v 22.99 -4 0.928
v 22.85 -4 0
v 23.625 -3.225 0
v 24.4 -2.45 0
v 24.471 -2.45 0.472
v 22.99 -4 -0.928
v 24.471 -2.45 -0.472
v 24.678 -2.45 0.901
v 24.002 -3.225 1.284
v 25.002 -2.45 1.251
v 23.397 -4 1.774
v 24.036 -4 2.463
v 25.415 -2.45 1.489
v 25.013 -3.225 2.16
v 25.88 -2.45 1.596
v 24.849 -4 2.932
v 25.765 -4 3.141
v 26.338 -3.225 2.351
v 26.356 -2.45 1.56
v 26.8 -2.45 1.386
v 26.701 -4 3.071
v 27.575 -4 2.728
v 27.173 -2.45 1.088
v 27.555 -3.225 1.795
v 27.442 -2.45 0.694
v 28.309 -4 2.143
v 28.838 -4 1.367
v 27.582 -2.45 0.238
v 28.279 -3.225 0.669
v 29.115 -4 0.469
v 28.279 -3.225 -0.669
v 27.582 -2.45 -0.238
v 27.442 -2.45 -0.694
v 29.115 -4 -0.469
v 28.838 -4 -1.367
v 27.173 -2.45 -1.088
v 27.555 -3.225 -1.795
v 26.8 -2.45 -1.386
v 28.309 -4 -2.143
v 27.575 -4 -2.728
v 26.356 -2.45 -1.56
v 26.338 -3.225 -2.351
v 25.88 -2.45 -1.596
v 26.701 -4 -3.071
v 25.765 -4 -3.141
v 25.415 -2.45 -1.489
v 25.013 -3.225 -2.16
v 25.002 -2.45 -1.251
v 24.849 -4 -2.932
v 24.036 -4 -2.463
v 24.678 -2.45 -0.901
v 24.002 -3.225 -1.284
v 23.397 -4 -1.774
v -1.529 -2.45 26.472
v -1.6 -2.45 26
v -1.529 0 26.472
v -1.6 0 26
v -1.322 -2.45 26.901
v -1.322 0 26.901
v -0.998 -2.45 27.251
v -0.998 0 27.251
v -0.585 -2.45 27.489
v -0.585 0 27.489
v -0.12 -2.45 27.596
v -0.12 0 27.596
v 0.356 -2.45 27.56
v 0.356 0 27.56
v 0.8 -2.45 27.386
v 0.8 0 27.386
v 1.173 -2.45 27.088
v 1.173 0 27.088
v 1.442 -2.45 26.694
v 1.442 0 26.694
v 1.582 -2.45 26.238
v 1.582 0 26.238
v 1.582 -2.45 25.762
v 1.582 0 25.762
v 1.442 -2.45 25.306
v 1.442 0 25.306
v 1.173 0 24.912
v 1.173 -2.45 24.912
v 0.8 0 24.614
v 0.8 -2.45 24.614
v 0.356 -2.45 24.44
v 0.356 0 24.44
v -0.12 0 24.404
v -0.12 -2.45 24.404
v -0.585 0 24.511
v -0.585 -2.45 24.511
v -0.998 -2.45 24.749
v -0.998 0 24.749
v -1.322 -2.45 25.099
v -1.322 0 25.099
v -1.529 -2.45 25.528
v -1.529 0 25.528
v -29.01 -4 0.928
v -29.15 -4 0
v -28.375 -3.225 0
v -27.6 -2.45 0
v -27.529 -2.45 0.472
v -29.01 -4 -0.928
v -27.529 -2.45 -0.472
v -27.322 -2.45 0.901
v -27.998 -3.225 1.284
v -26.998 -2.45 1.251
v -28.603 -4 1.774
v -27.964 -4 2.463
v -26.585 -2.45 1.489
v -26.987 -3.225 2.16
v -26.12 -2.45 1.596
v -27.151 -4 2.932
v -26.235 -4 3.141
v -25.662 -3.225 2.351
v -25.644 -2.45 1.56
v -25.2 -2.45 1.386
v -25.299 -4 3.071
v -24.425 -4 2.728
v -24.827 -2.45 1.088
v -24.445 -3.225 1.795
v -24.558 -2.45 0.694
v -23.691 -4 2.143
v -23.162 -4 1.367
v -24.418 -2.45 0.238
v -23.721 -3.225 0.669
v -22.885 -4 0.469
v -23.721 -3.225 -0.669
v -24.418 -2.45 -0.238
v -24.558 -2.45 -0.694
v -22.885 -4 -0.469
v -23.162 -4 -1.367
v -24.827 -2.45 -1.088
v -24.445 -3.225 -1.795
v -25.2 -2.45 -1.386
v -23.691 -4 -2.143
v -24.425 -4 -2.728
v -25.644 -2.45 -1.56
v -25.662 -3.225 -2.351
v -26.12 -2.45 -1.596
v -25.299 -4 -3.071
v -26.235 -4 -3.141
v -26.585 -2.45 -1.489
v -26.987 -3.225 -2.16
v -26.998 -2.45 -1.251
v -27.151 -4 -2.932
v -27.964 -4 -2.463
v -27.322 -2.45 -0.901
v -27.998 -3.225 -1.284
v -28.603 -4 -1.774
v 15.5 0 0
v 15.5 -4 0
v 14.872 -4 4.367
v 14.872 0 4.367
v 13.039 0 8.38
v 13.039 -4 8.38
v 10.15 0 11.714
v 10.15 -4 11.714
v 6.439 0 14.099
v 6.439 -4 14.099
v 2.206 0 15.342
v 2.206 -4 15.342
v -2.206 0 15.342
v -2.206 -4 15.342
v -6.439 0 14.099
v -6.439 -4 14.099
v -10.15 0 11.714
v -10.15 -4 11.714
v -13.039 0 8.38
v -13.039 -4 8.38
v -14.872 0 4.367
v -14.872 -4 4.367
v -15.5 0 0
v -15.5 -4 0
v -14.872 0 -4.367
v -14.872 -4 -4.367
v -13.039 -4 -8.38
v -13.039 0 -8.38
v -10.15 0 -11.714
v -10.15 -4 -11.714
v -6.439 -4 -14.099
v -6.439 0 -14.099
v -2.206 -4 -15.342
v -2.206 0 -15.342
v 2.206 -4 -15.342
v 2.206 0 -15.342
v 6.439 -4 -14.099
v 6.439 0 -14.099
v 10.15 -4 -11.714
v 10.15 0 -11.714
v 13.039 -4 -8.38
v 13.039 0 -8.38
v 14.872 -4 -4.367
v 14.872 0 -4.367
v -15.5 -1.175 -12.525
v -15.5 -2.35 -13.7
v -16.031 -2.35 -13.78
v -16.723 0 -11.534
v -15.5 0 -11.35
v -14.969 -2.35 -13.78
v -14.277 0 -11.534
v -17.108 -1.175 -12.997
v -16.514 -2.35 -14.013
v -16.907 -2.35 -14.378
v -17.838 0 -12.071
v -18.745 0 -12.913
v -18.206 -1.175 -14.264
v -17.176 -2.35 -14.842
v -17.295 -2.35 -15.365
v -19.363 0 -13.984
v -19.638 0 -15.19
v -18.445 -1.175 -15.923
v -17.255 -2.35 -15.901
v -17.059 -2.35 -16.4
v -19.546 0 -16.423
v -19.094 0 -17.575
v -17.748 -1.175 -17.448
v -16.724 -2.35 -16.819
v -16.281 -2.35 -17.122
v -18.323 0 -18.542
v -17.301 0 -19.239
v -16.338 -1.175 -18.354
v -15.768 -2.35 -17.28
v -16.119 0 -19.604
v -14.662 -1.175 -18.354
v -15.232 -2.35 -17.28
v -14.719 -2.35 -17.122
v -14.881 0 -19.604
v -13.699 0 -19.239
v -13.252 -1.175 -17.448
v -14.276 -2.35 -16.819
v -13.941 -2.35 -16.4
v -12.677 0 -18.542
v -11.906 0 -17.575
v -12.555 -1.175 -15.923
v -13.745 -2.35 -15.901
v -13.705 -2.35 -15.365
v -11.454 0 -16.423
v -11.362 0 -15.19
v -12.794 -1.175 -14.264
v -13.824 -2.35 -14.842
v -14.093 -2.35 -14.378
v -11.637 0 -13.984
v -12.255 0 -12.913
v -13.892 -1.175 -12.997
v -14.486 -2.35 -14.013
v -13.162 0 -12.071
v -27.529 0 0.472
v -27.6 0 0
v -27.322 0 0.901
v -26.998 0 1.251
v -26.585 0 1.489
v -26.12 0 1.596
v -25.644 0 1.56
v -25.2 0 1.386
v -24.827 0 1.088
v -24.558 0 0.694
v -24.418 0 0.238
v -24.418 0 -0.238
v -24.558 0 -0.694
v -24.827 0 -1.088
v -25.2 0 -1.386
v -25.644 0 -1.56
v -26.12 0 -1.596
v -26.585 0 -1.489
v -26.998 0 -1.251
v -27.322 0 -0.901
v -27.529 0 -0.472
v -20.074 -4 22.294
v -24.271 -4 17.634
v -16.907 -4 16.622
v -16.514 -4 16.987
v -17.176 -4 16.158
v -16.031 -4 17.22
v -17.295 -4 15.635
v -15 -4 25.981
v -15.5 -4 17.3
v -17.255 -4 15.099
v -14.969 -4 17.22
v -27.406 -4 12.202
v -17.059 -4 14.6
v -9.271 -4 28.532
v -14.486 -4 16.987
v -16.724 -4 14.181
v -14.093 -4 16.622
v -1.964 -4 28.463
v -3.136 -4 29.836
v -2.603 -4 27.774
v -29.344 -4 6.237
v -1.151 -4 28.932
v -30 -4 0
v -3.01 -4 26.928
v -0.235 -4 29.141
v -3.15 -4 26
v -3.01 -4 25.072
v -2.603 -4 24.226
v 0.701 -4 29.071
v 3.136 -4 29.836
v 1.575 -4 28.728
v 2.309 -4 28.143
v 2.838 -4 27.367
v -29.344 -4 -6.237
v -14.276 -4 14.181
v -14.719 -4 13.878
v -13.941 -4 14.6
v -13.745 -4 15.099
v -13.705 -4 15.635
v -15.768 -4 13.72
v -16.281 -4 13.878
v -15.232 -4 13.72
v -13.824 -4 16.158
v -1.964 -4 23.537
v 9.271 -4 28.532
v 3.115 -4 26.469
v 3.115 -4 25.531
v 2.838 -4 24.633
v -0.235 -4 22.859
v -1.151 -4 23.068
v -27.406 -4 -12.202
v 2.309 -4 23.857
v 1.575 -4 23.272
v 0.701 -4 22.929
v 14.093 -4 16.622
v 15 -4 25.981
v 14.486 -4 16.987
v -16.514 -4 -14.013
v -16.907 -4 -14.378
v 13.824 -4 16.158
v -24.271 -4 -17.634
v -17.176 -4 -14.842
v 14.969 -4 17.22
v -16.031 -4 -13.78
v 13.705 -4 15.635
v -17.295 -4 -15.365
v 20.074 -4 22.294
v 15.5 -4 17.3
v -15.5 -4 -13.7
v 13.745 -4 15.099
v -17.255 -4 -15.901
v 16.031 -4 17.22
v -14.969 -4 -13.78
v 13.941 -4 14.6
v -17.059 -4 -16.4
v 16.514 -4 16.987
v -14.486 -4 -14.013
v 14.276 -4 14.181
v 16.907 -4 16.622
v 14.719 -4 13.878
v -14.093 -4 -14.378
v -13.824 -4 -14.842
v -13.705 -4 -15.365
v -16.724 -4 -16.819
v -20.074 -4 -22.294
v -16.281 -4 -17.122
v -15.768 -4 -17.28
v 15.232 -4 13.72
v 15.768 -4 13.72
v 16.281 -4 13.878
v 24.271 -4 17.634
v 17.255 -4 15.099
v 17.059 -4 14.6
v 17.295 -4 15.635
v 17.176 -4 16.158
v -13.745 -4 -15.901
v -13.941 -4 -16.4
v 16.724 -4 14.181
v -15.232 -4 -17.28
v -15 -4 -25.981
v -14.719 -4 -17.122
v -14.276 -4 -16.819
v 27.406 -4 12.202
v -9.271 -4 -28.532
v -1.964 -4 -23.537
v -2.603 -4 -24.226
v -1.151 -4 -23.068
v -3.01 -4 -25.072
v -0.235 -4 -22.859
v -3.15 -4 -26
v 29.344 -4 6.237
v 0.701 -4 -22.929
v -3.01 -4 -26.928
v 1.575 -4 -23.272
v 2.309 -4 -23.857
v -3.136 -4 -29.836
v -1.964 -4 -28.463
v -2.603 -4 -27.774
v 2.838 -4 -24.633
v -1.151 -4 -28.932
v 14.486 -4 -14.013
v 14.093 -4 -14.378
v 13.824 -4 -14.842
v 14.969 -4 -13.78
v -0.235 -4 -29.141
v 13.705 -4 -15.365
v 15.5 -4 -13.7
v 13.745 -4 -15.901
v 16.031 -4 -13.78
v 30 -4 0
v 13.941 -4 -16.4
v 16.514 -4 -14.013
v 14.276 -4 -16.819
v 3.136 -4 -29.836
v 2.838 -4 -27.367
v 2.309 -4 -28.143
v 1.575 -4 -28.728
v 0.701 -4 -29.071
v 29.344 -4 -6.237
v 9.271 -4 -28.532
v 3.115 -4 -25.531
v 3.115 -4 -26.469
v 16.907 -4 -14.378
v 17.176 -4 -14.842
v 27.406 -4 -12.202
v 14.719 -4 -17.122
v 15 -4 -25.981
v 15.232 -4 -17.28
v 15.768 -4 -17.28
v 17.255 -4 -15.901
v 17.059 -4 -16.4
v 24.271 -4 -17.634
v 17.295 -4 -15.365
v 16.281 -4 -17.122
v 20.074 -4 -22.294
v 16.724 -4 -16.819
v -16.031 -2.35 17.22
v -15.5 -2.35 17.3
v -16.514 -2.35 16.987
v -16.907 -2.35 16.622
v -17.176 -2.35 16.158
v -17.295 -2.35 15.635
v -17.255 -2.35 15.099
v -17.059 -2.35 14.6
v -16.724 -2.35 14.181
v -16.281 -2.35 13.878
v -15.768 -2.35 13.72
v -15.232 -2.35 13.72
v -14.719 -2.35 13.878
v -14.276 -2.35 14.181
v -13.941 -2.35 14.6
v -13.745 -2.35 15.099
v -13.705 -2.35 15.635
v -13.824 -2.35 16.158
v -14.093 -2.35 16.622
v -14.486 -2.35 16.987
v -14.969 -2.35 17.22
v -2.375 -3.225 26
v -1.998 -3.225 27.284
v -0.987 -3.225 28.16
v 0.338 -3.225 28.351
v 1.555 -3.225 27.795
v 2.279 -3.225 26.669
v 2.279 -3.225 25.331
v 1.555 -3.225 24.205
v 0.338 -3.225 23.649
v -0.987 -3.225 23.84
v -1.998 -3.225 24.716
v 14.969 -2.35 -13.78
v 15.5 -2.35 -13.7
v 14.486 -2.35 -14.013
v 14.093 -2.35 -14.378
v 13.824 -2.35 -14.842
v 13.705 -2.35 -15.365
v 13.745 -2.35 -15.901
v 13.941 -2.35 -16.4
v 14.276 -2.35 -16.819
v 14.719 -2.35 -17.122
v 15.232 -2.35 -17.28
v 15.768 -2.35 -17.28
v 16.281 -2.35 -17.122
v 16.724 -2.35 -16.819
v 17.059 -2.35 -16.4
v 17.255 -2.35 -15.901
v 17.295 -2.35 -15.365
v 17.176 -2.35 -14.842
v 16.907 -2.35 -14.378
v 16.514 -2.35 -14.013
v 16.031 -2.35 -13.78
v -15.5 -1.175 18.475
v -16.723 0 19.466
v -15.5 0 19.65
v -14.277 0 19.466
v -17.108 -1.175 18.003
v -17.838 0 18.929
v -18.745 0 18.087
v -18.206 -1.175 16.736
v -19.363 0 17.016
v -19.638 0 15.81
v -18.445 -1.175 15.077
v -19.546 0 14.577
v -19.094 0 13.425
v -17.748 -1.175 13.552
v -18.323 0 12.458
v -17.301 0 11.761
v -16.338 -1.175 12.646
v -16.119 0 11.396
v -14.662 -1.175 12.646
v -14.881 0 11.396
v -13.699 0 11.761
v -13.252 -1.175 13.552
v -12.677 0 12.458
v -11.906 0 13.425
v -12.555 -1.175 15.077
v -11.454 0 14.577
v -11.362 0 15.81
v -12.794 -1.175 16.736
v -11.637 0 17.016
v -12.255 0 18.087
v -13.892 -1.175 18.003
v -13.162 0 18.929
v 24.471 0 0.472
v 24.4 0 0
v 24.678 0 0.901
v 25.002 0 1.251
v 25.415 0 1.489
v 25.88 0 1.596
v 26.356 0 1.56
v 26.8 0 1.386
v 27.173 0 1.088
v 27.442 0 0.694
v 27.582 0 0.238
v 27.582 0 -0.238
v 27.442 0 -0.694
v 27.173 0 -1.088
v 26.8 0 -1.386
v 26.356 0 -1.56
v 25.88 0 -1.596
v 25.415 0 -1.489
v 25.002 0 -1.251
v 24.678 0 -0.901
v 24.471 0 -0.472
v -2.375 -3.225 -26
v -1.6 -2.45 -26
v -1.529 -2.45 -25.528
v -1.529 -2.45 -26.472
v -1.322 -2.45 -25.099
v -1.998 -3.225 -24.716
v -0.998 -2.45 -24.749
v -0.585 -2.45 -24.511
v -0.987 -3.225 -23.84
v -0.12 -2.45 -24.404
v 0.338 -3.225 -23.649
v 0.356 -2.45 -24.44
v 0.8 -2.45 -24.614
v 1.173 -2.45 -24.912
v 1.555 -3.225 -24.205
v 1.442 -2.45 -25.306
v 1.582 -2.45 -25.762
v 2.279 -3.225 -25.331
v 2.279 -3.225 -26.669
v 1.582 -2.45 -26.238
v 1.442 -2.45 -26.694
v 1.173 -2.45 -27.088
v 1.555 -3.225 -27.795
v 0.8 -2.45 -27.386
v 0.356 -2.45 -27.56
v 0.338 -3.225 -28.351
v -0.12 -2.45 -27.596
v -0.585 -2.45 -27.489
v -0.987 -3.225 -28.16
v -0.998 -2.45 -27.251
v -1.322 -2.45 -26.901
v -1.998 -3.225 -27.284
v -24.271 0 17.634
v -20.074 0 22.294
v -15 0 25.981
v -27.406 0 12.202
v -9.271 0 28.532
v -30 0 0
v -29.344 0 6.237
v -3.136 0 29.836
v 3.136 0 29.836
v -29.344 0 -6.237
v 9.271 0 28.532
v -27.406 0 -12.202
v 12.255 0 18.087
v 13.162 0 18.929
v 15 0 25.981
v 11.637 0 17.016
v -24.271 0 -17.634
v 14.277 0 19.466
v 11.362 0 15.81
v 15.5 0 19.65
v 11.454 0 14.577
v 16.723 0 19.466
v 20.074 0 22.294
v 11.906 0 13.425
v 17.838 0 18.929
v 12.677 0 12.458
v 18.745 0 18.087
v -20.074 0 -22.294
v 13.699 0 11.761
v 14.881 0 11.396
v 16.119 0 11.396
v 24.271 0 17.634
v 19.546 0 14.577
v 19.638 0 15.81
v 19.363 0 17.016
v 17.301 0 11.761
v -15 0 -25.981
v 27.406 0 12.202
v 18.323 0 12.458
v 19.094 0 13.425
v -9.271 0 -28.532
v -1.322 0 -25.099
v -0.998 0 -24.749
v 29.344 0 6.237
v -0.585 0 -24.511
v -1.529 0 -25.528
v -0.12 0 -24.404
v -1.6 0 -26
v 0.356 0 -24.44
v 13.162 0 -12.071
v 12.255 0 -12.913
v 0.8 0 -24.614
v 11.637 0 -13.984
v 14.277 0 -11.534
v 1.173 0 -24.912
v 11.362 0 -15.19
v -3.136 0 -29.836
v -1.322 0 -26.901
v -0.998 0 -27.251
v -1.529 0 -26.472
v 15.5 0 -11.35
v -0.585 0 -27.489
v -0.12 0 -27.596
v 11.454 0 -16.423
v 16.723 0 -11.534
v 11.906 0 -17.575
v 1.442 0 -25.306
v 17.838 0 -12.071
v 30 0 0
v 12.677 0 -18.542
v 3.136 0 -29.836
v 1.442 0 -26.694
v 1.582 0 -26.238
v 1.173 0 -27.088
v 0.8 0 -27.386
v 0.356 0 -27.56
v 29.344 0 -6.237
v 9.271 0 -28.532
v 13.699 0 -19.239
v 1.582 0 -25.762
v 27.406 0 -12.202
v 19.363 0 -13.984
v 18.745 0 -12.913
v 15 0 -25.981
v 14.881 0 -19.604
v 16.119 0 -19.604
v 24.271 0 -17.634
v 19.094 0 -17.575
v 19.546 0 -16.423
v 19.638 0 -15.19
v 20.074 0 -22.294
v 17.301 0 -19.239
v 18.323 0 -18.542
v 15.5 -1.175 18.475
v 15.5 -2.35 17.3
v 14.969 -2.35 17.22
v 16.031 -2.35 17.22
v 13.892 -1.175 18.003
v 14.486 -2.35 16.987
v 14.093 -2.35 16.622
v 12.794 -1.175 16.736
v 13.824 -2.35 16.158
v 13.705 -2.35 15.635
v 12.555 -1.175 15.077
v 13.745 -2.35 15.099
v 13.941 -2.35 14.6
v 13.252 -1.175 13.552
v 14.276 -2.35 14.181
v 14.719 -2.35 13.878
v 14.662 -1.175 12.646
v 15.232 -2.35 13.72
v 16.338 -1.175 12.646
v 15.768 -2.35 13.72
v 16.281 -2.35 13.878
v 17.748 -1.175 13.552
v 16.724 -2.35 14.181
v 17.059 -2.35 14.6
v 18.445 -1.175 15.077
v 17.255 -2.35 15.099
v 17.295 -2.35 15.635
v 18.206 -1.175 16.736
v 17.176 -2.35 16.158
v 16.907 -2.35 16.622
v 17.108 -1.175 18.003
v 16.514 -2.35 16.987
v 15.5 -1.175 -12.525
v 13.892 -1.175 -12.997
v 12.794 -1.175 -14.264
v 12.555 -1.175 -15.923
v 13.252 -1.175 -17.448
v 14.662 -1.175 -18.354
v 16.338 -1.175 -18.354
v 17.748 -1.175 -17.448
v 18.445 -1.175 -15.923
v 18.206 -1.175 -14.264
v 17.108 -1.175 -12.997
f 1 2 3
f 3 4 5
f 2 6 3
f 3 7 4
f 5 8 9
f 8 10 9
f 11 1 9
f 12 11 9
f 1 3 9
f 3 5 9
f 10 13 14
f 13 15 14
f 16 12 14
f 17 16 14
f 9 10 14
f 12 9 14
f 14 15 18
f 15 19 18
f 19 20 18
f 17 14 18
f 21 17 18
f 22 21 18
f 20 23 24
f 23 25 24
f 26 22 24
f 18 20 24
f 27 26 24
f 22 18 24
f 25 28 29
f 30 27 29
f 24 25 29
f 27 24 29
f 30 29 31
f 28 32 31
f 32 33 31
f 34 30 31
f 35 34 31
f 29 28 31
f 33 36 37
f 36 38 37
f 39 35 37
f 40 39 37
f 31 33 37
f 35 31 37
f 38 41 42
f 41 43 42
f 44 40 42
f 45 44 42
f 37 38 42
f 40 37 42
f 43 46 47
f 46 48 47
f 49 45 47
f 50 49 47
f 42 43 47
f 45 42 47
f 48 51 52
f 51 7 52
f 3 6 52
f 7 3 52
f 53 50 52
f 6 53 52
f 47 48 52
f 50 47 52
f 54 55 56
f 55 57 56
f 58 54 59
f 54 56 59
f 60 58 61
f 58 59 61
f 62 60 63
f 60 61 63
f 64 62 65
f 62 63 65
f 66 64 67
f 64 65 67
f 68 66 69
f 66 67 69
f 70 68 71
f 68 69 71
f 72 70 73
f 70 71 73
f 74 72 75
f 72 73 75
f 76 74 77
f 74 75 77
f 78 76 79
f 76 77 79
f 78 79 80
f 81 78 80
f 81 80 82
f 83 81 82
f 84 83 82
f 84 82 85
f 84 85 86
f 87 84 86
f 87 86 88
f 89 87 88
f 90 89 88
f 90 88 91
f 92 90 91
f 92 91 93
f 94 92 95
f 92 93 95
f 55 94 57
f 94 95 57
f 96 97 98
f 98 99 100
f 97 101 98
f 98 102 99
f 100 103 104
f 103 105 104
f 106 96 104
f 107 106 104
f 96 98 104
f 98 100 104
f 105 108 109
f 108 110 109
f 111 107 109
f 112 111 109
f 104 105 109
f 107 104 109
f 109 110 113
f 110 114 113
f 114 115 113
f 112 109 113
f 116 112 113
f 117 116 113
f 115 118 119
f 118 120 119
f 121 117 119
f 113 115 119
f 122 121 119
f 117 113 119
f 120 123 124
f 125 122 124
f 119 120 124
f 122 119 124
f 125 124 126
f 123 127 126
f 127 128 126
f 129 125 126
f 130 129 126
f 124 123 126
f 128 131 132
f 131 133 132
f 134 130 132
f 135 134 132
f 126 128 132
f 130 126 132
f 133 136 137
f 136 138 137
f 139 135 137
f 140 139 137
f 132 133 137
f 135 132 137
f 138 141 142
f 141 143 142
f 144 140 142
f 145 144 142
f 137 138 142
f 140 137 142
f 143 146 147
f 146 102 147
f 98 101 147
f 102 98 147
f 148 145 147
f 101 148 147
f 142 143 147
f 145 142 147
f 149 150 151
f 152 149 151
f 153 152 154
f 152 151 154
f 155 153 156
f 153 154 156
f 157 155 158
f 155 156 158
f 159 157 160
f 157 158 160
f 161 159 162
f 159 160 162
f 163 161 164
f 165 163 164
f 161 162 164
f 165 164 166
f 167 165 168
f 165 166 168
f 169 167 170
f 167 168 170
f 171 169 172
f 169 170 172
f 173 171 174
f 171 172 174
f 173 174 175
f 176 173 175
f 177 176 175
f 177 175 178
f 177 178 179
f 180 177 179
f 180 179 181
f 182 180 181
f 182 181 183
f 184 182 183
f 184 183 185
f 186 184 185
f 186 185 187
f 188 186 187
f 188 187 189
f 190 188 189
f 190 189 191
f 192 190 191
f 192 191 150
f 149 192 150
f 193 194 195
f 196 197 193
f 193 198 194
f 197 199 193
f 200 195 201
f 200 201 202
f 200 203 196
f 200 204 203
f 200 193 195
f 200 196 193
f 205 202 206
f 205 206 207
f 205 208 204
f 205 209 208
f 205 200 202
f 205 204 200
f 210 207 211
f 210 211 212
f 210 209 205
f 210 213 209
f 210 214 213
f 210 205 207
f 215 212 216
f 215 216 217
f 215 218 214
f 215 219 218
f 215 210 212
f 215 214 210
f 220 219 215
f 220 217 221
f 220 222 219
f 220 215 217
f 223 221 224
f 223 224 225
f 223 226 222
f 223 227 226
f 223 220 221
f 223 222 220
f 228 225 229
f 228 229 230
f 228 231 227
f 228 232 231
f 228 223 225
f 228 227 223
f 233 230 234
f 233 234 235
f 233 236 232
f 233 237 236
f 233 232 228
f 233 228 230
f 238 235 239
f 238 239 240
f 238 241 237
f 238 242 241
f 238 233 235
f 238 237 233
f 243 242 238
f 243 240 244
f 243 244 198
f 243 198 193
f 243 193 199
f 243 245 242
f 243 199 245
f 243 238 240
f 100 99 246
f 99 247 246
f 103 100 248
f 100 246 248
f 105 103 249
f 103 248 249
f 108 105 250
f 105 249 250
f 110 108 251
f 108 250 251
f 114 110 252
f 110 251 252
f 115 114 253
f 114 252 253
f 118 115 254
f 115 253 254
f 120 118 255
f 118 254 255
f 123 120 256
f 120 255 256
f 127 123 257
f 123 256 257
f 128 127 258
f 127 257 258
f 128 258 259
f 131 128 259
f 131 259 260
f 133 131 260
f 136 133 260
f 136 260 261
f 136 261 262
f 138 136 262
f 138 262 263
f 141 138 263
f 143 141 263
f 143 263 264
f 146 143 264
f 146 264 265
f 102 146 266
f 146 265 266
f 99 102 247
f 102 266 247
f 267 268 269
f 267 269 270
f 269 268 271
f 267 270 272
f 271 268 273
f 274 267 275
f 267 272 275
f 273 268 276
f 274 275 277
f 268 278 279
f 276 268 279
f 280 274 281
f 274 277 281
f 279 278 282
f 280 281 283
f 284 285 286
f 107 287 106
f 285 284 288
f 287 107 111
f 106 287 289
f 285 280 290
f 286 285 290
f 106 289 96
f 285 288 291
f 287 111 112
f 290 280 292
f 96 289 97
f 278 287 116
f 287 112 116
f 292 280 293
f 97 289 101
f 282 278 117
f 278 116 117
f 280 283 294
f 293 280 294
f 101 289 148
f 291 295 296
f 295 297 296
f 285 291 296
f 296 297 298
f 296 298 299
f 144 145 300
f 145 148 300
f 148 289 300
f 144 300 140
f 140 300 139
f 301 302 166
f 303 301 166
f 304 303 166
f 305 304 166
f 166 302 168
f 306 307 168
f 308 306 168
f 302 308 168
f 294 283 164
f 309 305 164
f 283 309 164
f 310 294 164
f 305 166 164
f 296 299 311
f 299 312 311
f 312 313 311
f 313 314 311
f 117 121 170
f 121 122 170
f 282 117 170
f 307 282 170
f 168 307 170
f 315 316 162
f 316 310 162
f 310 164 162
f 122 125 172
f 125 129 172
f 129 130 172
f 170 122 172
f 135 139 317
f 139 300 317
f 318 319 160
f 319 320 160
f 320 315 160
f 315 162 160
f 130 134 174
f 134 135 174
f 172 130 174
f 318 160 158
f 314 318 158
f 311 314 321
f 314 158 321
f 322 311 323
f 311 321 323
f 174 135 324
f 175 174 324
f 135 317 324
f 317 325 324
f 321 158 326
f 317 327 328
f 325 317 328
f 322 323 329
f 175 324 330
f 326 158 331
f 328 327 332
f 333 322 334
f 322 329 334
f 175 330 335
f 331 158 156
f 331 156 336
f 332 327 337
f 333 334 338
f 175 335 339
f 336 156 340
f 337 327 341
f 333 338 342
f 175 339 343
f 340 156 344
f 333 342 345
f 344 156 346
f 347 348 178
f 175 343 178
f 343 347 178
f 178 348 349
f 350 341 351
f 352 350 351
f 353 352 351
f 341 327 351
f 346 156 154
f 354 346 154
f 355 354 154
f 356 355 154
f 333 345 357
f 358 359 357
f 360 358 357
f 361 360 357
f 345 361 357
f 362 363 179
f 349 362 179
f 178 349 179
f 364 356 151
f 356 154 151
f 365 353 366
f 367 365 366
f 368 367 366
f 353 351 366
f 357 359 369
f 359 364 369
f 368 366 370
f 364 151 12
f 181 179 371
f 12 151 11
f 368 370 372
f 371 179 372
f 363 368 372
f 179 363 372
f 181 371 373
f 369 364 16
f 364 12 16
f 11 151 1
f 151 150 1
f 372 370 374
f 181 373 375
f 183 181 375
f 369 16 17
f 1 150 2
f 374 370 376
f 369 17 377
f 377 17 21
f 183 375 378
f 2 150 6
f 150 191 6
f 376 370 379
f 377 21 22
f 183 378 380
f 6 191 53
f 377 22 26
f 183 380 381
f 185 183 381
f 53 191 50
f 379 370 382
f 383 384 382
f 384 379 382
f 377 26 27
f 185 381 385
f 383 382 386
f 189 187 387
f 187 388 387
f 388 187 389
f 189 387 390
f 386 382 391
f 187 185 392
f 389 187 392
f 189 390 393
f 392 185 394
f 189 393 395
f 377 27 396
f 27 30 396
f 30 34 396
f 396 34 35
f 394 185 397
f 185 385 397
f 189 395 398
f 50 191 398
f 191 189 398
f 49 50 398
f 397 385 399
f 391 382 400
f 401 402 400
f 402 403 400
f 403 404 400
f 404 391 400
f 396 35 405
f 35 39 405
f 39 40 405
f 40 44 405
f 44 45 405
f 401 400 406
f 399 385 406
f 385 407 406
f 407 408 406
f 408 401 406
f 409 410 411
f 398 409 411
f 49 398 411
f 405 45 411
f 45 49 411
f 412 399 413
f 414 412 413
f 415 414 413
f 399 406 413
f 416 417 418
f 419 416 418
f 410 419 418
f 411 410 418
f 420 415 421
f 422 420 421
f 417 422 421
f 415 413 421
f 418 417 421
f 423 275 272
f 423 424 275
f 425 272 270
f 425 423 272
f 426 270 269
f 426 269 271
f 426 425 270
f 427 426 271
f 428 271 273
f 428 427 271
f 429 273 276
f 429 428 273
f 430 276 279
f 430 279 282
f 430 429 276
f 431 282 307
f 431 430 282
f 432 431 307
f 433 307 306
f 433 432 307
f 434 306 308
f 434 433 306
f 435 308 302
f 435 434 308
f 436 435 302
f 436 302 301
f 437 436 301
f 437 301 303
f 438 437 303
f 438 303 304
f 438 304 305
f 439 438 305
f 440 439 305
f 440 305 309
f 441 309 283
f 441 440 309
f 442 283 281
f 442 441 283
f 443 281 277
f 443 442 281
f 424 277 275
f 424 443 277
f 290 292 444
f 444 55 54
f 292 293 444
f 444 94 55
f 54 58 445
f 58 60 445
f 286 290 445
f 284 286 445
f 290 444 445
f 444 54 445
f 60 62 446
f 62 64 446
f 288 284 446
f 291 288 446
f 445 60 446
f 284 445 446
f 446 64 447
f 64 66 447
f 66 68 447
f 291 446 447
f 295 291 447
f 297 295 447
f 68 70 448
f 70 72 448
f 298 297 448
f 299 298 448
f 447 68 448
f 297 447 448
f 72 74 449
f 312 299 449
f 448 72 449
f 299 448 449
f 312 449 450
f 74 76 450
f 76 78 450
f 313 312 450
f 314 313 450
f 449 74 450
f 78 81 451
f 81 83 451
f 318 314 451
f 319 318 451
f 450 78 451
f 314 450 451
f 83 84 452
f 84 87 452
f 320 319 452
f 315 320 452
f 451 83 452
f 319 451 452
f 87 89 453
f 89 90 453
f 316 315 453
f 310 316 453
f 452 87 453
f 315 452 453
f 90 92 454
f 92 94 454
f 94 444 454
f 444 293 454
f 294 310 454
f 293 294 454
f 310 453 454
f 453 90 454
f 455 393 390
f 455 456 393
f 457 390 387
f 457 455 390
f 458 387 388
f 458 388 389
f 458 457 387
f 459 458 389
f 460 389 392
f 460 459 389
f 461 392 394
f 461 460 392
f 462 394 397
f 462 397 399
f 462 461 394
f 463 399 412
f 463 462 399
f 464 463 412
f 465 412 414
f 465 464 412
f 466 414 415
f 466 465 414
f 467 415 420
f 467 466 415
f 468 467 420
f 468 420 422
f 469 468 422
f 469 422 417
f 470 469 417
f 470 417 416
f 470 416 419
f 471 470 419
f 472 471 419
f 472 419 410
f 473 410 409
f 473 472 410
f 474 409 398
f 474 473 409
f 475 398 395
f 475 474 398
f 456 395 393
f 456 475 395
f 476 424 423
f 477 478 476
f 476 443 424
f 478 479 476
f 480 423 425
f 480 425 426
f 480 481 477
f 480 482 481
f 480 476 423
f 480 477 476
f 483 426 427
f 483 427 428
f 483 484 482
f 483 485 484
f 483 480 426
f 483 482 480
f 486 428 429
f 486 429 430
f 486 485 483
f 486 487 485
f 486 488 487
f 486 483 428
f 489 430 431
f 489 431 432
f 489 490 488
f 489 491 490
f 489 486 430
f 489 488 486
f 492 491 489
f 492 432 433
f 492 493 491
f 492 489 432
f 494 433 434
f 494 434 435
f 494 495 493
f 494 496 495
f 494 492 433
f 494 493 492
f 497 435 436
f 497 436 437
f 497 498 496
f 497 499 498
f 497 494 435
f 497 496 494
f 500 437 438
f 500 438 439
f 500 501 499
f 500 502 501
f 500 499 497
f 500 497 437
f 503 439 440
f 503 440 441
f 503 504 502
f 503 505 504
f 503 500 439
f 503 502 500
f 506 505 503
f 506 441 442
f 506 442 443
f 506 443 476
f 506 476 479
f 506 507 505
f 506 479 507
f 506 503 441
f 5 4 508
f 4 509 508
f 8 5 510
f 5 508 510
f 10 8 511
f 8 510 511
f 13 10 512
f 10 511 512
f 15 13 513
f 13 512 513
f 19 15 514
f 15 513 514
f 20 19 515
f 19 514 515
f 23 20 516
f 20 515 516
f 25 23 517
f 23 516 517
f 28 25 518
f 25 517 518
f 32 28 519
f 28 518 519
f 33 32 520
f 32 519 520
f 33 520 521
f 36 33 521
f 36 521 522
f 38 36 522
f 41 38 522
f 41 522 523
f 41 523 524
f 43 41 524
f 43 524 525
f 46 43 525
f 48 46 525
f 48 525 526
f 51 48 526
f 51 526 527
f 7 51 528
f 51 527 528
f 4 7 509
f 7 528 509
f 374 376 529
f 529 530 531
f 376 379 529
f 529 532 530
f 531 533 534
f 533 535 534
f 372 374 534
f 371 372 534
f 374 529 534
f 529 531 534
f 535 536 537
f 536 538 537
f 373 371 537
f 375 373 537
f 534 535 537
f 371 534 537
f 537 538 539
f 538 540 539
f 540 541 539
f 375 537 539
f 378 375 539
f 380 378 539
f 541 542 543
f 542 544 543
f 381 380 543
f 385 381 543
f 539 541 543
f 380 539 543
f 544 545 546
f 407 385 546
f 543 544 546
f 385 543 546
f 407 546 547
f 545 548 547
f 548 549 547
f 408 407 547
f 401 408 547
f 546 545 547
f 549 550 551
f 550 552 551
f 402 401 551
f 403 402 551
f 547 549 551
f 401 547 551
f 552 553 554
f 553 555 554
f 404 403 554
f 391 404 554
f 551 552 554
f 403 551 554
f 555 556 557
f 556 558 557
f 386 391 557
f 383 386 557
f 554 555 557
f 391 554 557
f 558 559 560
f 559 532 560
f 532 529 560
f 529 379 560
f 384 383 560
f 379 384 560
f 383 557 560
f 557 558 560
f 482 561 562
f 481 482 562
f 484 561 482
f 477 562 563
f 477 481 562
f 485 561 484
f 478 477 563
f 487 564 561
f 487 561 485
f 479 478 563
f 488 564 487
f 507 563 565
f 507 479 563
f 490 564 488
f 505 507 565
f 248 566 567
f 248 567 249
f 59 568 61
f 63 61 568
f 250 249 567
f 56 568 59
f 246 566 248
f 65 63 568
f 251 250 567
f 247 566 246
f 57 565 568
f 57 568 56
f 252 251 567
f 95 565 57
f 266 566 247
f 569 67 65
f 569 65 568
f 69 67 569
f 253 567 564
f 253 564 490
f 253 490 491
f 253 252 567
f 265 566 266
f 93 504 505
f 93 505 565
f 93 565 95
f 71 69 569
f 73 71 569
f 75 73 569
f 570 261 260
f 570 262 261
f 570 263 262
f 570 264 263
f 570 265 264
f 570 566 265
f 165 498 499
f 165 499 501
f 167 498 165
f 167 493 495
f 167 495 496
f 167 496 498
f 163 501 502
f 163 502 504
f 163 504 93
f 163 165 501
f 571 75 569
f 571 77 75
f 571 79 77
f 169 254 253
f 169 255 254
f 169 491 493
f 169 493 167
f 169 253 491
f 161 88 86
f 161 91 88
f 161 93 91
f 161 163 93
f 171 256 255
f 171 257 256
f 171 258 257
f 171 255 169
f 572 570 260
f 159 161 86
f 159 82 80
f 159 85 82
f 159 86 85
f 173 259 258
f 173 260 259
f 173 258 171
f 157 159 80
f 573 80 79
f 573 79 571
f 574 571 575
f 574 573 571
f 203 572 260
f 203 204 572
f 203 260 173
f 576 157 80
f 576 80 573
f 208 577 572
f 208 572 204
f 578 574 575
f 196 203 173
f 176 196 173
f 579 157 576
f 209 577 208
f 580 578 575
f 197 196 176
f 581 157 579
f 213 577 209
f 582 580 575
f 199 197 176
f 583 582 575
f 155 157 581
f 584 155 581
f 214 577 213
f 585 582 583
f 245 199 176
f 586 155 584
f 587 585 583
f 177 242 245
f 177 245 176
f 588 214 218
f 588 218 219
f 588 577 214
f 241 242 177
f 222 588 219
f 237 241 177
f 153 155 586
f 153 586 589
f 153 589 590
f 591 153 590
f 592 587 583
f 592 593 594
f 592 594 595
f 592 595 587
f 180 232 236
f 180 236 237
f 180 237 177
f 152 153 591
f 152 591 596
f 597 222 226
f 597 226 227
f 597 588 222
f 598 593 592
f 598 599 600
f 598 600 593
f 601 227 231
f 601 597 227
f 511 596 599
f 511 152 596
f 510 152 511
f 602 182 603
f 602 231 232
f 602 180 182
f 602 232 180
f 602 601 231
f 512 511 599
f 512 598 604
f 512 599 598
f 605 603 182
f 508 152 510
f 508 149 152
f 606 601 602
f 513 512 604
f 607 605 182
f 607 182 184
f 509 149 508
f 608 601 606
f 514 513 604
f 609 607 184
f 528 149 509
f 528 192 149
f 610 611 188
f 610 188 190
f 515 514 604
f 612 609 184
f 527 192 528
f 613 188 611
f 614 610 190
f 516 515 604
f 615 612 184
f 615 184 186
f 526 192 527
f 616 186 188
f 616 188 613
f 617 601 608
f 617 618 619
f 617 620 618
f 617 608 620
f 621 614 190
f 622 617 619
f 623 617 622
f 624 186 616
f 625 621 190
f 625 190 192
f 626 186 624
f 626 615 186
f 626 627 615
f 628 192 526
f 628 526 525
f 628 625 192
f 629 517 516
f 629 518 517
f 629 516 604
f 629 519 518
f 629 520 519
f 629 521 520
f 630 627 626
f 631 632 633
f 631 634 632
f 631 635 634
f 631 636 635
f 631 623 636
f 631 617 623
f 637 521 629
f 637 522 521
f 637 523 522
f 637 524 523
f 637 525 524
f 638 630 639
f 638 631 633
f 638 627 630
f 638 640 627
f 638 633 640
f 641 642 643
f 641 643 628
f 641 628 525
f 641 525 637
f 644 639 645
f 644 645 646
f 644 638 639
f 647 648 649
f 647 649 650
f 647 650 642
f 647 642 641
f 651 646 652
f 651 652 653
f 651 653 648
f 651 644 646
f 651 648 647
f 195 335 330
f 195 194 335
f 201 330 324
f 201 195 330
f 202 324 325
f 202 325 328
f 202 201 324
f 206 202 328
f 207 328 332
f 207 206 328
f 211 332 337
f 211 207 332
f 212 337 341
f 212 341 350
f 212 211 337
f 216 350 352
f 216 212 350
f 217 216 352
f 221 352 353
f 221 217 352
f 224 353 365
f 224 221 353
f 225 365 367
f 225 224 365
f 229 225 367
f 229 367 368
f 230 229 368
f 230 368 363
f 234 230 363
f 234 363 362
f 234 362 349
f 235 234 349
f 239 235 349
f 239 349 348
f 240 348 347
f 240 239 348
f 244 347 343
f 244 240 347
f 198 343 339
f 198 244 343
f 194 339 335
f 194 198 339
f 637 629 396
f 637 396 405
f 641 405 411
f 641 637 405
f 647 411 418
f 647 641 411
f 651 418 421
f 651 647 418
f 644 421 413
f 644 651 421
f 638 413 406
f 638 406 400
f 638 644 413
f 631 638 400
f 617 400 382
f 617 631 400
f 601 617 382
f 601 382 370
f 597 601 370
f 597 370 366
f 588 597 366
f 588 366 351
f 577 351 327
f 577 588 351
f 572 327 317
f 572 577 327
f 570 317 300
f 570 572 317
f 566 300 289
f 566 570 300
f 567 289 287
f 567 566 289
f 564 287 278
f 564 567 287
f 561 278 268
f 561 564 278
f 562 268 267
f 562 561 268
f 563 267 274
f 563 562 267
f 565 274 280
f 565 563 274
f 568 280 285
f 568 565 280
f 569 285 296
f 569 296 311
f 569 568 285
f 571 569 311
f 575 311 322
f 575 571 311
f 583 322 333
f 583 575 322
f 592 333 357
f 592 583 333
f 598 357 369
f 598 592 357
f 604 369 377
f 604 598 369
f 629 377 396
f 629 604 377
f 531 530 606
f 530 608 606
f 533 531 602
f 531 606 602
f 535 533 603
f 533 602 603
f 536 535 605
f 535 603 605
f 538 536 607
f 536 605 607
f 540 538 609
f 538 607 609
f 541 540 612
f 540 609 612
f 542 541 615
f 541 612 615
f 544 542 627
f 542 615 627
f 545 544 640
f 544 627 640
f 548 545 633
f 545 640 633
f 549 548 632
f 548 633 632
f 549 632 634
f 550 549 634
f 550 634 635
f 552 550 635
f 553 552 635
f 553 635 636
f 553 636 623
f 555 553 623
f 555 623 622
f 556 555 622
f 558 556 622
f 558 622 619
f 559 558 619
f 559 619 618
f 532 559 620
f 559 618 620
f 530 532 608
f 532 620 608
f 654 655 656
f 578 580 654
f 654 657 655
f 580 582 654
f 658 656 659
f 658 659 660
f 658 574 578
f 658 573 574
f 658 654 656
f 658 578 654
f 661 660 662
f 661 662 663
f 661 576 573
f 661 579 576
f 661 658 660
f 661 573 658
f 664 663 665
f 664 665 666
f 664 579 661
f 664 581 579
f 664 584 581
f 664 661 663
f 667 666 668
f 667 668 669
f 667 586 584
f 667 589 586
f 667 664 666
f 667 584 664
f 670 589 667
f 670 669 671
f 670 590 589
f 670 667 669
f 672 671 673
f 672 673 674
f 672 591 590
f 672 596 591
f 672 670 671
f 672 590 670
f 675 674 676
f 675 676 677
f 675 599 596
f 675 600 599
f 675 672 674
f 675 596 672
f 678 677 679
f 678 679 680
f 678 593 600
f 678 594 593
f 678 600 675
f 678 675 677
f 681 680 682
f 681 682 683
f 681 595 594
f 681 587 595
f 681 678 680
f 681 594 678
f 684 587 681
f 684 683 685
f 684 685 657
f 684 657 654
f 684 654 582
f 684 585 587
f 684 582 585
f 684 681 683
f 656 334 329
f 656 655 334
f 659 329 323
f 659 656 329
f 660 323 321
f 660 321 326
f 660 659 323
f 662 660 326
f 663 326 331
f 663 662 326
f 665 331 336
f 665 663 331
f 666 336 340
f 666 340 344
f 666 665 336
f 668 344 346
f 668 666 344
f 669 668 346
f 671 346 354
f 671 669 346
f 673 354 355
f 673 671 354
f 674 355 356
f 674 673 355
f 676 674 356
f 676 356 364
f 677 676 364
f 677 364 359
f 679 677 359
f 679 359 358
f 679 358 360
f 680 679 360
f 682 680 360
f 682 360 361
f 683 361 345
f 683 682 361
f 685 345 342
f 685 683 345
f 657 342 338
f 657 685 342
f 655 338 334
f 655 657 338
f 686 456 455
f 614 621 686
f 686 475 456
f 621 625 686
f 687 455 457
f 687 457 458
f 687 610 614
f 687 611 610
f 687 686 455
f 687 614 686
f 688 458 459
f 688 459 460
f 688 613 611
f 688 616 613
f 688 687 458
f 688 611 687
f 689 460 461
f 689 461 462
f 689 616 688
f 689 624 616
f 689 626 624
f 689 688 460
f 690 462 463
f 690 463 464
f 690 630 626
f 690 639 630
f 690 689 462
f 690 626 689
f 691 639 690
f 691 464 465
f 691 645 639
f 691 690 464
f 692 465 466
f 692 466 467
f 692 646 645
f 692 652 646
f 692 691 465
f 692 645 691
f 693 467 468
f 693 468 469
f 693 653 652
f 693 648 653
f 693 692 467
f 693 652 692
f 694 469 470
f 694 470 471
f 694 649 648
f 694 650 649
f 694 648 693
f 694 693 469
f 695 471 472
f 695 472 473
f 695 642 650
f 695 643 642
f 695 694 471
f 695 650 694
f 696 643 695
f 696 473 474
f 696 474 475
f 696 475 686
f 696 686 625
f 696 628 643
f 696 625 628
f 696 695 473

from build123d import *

# Parameters (mm, degrees)
SKETCH1_R                                           = 30
BOSS_EXTRUDE1_DEPTH                                 = 4
SKETCH8_R                                           = 15.5
CUT_EXTRUDE1_DEPTH                                  = 6
CSK_FOR_M3_COUNTERSUNK_FLAT_HEAD_SCR_2_COUNT        = 2
CSK_FOR_M3_COUNTERSUNK_FLAT_HEAD_SCR_2_PITCH        = 31
CSK_FOR_M3_COUNTERSUNK_FLAT_HEAD_SCR_3_COUNT        = 2
CSK_FOR_M3_COUNTERSUNK_FLAT_HEAD_SCR_3_PITCH        = 43.840620434
CSK_FOR_M3_COUNTERSUNK_FLAT_HEAD_SCR_4_COUNT        = 2
CSK_FOR_M3_COUNTERSUNK_FLAT_HEAD_SCR_4_PITCH        = 31
CSK_FOR_M3_COUNTERSUNK_FLAT_HEAD_SCREW3_D           = 3.2
CSK_FOR_M3_COUNTERSUNK_FLAT_HEAD_SCREW3_CSINK_D     = 6.3
CSK_FOR_M3_COUNTERSUNK_FLAT_HEAD_SCREW3_CSINK_ANGLE = 90


with BuildPart() as part:
    # Sketch1 → Boss-Extrude1 (new body)
    with BuildSketch(Plane(origin=(0, 0, 0), x_dir=(1, 0, 0), z_dir=(0, 1, 0))):
        Circle(SKETCH1_R)
    extrude(amount=-BOSS_EXTRUDE1_DEPTH)

    # Sketch8 → Cut-Extrude1 (cut)
    with BuildSketch(Plane.XZ.offset(4)):
        Circle(SKETCH8_R)
    extrude(amount=-CUT_EXTRUDE1_DEPTH, mode=Mode.SUBTRACT)

    # Sketch16 → CSK for M3 Countersunk Flat Head Screw2 (revolve, cut)
    with BuildSketch(Plane(origin=(15.5, 0, 15.5), x_dir=(0, 0, 1), z_dir=(1, 0, 0))):
        Polygon((0, 0), (0, 4), (1.8, 4), (1.8, 2.35), (4.15, 0), align=None)
    csk_for_m3_countersunk_flat_head_screw2 = revolve(axis=Axis((15.5, 6.35, 15.5), (0, -1, 0)), mode=Mode.SUBTRACT)

    # CSK for M3 Countersunk Flat Head Scr 2: CSK for M3 Countersunk Flat Head Screw2 ×2
    with Locations(*[(0, 0, -i * CSK_FOR_M3_COUNTERSUNK_FLAT_HEAD_SCR_2_PITCH) for i in range(1, CSK_FOR_M3_COUNTERSUNK_FLAT_HEAD_SCR_2_COUNT)]):
        add(csk_for_m3_countersunk_flat_head_screw2, mode=Mode.SUBTRACT)

    # CSK for M3 Countersunk Flat Head Scr 3: CSK for M3 Countersunk Flat Head Screw2 ×2
    with Locations(*[Vector(-0.707106781, 0, -0.707106781) * (i * CSK_FOR_M3_COUNTERSUNK_FLAT_HEAD_SCR_3_PITCH) for i in range(1, CSK_FOR_M3_COUNTERSUNK_FLAT_HEAD_SCR_3_COUNT)]):
        add(csk_for_m3_countersunk_flat_head_screw2, mode=Mode.SUBTRACT)

    # CSK for M3 Countersunk Flat Head Scr 4: CSK for M3 Countersunk Flat Head Screw2 ×2
    with Locations(*[(-i * CSK_FOR_M3_COUNTERSUNK_FLAT_HEAD_SCR_4_PITCH, 0, 0) for i in range(1, CSK_FOR_M3_COUNTERSUNK_FLAT_HEAD_SCR_4_COUNT)]):
        add(csk_for_m3_countersunk_flat_head_screw2, mode=Mode.SUBTRACT)

    # CSK for M3 Countersunk Flat Head Screw3 (through all)
    with Locations(Plane.XZ.offset(4)):
        with Locations((0, 26), (26, 0), (0, -26), (-26, 0)):
            CounterSinkHole(CSK_FOR_M3_COUNTERSUNK_FLAT_HEAD_SCREW3_D / 2, CSK_FOR_M3_COUNTERSUNK_FLAT_HEAD_SCREW3_CSINK_D / 2, counter_sink_angle=CSK_FOR_M3_COUNTERSUNK_FLAT_HEAD_SCREW3_CSINK_ANGLE)


solid = part.part
